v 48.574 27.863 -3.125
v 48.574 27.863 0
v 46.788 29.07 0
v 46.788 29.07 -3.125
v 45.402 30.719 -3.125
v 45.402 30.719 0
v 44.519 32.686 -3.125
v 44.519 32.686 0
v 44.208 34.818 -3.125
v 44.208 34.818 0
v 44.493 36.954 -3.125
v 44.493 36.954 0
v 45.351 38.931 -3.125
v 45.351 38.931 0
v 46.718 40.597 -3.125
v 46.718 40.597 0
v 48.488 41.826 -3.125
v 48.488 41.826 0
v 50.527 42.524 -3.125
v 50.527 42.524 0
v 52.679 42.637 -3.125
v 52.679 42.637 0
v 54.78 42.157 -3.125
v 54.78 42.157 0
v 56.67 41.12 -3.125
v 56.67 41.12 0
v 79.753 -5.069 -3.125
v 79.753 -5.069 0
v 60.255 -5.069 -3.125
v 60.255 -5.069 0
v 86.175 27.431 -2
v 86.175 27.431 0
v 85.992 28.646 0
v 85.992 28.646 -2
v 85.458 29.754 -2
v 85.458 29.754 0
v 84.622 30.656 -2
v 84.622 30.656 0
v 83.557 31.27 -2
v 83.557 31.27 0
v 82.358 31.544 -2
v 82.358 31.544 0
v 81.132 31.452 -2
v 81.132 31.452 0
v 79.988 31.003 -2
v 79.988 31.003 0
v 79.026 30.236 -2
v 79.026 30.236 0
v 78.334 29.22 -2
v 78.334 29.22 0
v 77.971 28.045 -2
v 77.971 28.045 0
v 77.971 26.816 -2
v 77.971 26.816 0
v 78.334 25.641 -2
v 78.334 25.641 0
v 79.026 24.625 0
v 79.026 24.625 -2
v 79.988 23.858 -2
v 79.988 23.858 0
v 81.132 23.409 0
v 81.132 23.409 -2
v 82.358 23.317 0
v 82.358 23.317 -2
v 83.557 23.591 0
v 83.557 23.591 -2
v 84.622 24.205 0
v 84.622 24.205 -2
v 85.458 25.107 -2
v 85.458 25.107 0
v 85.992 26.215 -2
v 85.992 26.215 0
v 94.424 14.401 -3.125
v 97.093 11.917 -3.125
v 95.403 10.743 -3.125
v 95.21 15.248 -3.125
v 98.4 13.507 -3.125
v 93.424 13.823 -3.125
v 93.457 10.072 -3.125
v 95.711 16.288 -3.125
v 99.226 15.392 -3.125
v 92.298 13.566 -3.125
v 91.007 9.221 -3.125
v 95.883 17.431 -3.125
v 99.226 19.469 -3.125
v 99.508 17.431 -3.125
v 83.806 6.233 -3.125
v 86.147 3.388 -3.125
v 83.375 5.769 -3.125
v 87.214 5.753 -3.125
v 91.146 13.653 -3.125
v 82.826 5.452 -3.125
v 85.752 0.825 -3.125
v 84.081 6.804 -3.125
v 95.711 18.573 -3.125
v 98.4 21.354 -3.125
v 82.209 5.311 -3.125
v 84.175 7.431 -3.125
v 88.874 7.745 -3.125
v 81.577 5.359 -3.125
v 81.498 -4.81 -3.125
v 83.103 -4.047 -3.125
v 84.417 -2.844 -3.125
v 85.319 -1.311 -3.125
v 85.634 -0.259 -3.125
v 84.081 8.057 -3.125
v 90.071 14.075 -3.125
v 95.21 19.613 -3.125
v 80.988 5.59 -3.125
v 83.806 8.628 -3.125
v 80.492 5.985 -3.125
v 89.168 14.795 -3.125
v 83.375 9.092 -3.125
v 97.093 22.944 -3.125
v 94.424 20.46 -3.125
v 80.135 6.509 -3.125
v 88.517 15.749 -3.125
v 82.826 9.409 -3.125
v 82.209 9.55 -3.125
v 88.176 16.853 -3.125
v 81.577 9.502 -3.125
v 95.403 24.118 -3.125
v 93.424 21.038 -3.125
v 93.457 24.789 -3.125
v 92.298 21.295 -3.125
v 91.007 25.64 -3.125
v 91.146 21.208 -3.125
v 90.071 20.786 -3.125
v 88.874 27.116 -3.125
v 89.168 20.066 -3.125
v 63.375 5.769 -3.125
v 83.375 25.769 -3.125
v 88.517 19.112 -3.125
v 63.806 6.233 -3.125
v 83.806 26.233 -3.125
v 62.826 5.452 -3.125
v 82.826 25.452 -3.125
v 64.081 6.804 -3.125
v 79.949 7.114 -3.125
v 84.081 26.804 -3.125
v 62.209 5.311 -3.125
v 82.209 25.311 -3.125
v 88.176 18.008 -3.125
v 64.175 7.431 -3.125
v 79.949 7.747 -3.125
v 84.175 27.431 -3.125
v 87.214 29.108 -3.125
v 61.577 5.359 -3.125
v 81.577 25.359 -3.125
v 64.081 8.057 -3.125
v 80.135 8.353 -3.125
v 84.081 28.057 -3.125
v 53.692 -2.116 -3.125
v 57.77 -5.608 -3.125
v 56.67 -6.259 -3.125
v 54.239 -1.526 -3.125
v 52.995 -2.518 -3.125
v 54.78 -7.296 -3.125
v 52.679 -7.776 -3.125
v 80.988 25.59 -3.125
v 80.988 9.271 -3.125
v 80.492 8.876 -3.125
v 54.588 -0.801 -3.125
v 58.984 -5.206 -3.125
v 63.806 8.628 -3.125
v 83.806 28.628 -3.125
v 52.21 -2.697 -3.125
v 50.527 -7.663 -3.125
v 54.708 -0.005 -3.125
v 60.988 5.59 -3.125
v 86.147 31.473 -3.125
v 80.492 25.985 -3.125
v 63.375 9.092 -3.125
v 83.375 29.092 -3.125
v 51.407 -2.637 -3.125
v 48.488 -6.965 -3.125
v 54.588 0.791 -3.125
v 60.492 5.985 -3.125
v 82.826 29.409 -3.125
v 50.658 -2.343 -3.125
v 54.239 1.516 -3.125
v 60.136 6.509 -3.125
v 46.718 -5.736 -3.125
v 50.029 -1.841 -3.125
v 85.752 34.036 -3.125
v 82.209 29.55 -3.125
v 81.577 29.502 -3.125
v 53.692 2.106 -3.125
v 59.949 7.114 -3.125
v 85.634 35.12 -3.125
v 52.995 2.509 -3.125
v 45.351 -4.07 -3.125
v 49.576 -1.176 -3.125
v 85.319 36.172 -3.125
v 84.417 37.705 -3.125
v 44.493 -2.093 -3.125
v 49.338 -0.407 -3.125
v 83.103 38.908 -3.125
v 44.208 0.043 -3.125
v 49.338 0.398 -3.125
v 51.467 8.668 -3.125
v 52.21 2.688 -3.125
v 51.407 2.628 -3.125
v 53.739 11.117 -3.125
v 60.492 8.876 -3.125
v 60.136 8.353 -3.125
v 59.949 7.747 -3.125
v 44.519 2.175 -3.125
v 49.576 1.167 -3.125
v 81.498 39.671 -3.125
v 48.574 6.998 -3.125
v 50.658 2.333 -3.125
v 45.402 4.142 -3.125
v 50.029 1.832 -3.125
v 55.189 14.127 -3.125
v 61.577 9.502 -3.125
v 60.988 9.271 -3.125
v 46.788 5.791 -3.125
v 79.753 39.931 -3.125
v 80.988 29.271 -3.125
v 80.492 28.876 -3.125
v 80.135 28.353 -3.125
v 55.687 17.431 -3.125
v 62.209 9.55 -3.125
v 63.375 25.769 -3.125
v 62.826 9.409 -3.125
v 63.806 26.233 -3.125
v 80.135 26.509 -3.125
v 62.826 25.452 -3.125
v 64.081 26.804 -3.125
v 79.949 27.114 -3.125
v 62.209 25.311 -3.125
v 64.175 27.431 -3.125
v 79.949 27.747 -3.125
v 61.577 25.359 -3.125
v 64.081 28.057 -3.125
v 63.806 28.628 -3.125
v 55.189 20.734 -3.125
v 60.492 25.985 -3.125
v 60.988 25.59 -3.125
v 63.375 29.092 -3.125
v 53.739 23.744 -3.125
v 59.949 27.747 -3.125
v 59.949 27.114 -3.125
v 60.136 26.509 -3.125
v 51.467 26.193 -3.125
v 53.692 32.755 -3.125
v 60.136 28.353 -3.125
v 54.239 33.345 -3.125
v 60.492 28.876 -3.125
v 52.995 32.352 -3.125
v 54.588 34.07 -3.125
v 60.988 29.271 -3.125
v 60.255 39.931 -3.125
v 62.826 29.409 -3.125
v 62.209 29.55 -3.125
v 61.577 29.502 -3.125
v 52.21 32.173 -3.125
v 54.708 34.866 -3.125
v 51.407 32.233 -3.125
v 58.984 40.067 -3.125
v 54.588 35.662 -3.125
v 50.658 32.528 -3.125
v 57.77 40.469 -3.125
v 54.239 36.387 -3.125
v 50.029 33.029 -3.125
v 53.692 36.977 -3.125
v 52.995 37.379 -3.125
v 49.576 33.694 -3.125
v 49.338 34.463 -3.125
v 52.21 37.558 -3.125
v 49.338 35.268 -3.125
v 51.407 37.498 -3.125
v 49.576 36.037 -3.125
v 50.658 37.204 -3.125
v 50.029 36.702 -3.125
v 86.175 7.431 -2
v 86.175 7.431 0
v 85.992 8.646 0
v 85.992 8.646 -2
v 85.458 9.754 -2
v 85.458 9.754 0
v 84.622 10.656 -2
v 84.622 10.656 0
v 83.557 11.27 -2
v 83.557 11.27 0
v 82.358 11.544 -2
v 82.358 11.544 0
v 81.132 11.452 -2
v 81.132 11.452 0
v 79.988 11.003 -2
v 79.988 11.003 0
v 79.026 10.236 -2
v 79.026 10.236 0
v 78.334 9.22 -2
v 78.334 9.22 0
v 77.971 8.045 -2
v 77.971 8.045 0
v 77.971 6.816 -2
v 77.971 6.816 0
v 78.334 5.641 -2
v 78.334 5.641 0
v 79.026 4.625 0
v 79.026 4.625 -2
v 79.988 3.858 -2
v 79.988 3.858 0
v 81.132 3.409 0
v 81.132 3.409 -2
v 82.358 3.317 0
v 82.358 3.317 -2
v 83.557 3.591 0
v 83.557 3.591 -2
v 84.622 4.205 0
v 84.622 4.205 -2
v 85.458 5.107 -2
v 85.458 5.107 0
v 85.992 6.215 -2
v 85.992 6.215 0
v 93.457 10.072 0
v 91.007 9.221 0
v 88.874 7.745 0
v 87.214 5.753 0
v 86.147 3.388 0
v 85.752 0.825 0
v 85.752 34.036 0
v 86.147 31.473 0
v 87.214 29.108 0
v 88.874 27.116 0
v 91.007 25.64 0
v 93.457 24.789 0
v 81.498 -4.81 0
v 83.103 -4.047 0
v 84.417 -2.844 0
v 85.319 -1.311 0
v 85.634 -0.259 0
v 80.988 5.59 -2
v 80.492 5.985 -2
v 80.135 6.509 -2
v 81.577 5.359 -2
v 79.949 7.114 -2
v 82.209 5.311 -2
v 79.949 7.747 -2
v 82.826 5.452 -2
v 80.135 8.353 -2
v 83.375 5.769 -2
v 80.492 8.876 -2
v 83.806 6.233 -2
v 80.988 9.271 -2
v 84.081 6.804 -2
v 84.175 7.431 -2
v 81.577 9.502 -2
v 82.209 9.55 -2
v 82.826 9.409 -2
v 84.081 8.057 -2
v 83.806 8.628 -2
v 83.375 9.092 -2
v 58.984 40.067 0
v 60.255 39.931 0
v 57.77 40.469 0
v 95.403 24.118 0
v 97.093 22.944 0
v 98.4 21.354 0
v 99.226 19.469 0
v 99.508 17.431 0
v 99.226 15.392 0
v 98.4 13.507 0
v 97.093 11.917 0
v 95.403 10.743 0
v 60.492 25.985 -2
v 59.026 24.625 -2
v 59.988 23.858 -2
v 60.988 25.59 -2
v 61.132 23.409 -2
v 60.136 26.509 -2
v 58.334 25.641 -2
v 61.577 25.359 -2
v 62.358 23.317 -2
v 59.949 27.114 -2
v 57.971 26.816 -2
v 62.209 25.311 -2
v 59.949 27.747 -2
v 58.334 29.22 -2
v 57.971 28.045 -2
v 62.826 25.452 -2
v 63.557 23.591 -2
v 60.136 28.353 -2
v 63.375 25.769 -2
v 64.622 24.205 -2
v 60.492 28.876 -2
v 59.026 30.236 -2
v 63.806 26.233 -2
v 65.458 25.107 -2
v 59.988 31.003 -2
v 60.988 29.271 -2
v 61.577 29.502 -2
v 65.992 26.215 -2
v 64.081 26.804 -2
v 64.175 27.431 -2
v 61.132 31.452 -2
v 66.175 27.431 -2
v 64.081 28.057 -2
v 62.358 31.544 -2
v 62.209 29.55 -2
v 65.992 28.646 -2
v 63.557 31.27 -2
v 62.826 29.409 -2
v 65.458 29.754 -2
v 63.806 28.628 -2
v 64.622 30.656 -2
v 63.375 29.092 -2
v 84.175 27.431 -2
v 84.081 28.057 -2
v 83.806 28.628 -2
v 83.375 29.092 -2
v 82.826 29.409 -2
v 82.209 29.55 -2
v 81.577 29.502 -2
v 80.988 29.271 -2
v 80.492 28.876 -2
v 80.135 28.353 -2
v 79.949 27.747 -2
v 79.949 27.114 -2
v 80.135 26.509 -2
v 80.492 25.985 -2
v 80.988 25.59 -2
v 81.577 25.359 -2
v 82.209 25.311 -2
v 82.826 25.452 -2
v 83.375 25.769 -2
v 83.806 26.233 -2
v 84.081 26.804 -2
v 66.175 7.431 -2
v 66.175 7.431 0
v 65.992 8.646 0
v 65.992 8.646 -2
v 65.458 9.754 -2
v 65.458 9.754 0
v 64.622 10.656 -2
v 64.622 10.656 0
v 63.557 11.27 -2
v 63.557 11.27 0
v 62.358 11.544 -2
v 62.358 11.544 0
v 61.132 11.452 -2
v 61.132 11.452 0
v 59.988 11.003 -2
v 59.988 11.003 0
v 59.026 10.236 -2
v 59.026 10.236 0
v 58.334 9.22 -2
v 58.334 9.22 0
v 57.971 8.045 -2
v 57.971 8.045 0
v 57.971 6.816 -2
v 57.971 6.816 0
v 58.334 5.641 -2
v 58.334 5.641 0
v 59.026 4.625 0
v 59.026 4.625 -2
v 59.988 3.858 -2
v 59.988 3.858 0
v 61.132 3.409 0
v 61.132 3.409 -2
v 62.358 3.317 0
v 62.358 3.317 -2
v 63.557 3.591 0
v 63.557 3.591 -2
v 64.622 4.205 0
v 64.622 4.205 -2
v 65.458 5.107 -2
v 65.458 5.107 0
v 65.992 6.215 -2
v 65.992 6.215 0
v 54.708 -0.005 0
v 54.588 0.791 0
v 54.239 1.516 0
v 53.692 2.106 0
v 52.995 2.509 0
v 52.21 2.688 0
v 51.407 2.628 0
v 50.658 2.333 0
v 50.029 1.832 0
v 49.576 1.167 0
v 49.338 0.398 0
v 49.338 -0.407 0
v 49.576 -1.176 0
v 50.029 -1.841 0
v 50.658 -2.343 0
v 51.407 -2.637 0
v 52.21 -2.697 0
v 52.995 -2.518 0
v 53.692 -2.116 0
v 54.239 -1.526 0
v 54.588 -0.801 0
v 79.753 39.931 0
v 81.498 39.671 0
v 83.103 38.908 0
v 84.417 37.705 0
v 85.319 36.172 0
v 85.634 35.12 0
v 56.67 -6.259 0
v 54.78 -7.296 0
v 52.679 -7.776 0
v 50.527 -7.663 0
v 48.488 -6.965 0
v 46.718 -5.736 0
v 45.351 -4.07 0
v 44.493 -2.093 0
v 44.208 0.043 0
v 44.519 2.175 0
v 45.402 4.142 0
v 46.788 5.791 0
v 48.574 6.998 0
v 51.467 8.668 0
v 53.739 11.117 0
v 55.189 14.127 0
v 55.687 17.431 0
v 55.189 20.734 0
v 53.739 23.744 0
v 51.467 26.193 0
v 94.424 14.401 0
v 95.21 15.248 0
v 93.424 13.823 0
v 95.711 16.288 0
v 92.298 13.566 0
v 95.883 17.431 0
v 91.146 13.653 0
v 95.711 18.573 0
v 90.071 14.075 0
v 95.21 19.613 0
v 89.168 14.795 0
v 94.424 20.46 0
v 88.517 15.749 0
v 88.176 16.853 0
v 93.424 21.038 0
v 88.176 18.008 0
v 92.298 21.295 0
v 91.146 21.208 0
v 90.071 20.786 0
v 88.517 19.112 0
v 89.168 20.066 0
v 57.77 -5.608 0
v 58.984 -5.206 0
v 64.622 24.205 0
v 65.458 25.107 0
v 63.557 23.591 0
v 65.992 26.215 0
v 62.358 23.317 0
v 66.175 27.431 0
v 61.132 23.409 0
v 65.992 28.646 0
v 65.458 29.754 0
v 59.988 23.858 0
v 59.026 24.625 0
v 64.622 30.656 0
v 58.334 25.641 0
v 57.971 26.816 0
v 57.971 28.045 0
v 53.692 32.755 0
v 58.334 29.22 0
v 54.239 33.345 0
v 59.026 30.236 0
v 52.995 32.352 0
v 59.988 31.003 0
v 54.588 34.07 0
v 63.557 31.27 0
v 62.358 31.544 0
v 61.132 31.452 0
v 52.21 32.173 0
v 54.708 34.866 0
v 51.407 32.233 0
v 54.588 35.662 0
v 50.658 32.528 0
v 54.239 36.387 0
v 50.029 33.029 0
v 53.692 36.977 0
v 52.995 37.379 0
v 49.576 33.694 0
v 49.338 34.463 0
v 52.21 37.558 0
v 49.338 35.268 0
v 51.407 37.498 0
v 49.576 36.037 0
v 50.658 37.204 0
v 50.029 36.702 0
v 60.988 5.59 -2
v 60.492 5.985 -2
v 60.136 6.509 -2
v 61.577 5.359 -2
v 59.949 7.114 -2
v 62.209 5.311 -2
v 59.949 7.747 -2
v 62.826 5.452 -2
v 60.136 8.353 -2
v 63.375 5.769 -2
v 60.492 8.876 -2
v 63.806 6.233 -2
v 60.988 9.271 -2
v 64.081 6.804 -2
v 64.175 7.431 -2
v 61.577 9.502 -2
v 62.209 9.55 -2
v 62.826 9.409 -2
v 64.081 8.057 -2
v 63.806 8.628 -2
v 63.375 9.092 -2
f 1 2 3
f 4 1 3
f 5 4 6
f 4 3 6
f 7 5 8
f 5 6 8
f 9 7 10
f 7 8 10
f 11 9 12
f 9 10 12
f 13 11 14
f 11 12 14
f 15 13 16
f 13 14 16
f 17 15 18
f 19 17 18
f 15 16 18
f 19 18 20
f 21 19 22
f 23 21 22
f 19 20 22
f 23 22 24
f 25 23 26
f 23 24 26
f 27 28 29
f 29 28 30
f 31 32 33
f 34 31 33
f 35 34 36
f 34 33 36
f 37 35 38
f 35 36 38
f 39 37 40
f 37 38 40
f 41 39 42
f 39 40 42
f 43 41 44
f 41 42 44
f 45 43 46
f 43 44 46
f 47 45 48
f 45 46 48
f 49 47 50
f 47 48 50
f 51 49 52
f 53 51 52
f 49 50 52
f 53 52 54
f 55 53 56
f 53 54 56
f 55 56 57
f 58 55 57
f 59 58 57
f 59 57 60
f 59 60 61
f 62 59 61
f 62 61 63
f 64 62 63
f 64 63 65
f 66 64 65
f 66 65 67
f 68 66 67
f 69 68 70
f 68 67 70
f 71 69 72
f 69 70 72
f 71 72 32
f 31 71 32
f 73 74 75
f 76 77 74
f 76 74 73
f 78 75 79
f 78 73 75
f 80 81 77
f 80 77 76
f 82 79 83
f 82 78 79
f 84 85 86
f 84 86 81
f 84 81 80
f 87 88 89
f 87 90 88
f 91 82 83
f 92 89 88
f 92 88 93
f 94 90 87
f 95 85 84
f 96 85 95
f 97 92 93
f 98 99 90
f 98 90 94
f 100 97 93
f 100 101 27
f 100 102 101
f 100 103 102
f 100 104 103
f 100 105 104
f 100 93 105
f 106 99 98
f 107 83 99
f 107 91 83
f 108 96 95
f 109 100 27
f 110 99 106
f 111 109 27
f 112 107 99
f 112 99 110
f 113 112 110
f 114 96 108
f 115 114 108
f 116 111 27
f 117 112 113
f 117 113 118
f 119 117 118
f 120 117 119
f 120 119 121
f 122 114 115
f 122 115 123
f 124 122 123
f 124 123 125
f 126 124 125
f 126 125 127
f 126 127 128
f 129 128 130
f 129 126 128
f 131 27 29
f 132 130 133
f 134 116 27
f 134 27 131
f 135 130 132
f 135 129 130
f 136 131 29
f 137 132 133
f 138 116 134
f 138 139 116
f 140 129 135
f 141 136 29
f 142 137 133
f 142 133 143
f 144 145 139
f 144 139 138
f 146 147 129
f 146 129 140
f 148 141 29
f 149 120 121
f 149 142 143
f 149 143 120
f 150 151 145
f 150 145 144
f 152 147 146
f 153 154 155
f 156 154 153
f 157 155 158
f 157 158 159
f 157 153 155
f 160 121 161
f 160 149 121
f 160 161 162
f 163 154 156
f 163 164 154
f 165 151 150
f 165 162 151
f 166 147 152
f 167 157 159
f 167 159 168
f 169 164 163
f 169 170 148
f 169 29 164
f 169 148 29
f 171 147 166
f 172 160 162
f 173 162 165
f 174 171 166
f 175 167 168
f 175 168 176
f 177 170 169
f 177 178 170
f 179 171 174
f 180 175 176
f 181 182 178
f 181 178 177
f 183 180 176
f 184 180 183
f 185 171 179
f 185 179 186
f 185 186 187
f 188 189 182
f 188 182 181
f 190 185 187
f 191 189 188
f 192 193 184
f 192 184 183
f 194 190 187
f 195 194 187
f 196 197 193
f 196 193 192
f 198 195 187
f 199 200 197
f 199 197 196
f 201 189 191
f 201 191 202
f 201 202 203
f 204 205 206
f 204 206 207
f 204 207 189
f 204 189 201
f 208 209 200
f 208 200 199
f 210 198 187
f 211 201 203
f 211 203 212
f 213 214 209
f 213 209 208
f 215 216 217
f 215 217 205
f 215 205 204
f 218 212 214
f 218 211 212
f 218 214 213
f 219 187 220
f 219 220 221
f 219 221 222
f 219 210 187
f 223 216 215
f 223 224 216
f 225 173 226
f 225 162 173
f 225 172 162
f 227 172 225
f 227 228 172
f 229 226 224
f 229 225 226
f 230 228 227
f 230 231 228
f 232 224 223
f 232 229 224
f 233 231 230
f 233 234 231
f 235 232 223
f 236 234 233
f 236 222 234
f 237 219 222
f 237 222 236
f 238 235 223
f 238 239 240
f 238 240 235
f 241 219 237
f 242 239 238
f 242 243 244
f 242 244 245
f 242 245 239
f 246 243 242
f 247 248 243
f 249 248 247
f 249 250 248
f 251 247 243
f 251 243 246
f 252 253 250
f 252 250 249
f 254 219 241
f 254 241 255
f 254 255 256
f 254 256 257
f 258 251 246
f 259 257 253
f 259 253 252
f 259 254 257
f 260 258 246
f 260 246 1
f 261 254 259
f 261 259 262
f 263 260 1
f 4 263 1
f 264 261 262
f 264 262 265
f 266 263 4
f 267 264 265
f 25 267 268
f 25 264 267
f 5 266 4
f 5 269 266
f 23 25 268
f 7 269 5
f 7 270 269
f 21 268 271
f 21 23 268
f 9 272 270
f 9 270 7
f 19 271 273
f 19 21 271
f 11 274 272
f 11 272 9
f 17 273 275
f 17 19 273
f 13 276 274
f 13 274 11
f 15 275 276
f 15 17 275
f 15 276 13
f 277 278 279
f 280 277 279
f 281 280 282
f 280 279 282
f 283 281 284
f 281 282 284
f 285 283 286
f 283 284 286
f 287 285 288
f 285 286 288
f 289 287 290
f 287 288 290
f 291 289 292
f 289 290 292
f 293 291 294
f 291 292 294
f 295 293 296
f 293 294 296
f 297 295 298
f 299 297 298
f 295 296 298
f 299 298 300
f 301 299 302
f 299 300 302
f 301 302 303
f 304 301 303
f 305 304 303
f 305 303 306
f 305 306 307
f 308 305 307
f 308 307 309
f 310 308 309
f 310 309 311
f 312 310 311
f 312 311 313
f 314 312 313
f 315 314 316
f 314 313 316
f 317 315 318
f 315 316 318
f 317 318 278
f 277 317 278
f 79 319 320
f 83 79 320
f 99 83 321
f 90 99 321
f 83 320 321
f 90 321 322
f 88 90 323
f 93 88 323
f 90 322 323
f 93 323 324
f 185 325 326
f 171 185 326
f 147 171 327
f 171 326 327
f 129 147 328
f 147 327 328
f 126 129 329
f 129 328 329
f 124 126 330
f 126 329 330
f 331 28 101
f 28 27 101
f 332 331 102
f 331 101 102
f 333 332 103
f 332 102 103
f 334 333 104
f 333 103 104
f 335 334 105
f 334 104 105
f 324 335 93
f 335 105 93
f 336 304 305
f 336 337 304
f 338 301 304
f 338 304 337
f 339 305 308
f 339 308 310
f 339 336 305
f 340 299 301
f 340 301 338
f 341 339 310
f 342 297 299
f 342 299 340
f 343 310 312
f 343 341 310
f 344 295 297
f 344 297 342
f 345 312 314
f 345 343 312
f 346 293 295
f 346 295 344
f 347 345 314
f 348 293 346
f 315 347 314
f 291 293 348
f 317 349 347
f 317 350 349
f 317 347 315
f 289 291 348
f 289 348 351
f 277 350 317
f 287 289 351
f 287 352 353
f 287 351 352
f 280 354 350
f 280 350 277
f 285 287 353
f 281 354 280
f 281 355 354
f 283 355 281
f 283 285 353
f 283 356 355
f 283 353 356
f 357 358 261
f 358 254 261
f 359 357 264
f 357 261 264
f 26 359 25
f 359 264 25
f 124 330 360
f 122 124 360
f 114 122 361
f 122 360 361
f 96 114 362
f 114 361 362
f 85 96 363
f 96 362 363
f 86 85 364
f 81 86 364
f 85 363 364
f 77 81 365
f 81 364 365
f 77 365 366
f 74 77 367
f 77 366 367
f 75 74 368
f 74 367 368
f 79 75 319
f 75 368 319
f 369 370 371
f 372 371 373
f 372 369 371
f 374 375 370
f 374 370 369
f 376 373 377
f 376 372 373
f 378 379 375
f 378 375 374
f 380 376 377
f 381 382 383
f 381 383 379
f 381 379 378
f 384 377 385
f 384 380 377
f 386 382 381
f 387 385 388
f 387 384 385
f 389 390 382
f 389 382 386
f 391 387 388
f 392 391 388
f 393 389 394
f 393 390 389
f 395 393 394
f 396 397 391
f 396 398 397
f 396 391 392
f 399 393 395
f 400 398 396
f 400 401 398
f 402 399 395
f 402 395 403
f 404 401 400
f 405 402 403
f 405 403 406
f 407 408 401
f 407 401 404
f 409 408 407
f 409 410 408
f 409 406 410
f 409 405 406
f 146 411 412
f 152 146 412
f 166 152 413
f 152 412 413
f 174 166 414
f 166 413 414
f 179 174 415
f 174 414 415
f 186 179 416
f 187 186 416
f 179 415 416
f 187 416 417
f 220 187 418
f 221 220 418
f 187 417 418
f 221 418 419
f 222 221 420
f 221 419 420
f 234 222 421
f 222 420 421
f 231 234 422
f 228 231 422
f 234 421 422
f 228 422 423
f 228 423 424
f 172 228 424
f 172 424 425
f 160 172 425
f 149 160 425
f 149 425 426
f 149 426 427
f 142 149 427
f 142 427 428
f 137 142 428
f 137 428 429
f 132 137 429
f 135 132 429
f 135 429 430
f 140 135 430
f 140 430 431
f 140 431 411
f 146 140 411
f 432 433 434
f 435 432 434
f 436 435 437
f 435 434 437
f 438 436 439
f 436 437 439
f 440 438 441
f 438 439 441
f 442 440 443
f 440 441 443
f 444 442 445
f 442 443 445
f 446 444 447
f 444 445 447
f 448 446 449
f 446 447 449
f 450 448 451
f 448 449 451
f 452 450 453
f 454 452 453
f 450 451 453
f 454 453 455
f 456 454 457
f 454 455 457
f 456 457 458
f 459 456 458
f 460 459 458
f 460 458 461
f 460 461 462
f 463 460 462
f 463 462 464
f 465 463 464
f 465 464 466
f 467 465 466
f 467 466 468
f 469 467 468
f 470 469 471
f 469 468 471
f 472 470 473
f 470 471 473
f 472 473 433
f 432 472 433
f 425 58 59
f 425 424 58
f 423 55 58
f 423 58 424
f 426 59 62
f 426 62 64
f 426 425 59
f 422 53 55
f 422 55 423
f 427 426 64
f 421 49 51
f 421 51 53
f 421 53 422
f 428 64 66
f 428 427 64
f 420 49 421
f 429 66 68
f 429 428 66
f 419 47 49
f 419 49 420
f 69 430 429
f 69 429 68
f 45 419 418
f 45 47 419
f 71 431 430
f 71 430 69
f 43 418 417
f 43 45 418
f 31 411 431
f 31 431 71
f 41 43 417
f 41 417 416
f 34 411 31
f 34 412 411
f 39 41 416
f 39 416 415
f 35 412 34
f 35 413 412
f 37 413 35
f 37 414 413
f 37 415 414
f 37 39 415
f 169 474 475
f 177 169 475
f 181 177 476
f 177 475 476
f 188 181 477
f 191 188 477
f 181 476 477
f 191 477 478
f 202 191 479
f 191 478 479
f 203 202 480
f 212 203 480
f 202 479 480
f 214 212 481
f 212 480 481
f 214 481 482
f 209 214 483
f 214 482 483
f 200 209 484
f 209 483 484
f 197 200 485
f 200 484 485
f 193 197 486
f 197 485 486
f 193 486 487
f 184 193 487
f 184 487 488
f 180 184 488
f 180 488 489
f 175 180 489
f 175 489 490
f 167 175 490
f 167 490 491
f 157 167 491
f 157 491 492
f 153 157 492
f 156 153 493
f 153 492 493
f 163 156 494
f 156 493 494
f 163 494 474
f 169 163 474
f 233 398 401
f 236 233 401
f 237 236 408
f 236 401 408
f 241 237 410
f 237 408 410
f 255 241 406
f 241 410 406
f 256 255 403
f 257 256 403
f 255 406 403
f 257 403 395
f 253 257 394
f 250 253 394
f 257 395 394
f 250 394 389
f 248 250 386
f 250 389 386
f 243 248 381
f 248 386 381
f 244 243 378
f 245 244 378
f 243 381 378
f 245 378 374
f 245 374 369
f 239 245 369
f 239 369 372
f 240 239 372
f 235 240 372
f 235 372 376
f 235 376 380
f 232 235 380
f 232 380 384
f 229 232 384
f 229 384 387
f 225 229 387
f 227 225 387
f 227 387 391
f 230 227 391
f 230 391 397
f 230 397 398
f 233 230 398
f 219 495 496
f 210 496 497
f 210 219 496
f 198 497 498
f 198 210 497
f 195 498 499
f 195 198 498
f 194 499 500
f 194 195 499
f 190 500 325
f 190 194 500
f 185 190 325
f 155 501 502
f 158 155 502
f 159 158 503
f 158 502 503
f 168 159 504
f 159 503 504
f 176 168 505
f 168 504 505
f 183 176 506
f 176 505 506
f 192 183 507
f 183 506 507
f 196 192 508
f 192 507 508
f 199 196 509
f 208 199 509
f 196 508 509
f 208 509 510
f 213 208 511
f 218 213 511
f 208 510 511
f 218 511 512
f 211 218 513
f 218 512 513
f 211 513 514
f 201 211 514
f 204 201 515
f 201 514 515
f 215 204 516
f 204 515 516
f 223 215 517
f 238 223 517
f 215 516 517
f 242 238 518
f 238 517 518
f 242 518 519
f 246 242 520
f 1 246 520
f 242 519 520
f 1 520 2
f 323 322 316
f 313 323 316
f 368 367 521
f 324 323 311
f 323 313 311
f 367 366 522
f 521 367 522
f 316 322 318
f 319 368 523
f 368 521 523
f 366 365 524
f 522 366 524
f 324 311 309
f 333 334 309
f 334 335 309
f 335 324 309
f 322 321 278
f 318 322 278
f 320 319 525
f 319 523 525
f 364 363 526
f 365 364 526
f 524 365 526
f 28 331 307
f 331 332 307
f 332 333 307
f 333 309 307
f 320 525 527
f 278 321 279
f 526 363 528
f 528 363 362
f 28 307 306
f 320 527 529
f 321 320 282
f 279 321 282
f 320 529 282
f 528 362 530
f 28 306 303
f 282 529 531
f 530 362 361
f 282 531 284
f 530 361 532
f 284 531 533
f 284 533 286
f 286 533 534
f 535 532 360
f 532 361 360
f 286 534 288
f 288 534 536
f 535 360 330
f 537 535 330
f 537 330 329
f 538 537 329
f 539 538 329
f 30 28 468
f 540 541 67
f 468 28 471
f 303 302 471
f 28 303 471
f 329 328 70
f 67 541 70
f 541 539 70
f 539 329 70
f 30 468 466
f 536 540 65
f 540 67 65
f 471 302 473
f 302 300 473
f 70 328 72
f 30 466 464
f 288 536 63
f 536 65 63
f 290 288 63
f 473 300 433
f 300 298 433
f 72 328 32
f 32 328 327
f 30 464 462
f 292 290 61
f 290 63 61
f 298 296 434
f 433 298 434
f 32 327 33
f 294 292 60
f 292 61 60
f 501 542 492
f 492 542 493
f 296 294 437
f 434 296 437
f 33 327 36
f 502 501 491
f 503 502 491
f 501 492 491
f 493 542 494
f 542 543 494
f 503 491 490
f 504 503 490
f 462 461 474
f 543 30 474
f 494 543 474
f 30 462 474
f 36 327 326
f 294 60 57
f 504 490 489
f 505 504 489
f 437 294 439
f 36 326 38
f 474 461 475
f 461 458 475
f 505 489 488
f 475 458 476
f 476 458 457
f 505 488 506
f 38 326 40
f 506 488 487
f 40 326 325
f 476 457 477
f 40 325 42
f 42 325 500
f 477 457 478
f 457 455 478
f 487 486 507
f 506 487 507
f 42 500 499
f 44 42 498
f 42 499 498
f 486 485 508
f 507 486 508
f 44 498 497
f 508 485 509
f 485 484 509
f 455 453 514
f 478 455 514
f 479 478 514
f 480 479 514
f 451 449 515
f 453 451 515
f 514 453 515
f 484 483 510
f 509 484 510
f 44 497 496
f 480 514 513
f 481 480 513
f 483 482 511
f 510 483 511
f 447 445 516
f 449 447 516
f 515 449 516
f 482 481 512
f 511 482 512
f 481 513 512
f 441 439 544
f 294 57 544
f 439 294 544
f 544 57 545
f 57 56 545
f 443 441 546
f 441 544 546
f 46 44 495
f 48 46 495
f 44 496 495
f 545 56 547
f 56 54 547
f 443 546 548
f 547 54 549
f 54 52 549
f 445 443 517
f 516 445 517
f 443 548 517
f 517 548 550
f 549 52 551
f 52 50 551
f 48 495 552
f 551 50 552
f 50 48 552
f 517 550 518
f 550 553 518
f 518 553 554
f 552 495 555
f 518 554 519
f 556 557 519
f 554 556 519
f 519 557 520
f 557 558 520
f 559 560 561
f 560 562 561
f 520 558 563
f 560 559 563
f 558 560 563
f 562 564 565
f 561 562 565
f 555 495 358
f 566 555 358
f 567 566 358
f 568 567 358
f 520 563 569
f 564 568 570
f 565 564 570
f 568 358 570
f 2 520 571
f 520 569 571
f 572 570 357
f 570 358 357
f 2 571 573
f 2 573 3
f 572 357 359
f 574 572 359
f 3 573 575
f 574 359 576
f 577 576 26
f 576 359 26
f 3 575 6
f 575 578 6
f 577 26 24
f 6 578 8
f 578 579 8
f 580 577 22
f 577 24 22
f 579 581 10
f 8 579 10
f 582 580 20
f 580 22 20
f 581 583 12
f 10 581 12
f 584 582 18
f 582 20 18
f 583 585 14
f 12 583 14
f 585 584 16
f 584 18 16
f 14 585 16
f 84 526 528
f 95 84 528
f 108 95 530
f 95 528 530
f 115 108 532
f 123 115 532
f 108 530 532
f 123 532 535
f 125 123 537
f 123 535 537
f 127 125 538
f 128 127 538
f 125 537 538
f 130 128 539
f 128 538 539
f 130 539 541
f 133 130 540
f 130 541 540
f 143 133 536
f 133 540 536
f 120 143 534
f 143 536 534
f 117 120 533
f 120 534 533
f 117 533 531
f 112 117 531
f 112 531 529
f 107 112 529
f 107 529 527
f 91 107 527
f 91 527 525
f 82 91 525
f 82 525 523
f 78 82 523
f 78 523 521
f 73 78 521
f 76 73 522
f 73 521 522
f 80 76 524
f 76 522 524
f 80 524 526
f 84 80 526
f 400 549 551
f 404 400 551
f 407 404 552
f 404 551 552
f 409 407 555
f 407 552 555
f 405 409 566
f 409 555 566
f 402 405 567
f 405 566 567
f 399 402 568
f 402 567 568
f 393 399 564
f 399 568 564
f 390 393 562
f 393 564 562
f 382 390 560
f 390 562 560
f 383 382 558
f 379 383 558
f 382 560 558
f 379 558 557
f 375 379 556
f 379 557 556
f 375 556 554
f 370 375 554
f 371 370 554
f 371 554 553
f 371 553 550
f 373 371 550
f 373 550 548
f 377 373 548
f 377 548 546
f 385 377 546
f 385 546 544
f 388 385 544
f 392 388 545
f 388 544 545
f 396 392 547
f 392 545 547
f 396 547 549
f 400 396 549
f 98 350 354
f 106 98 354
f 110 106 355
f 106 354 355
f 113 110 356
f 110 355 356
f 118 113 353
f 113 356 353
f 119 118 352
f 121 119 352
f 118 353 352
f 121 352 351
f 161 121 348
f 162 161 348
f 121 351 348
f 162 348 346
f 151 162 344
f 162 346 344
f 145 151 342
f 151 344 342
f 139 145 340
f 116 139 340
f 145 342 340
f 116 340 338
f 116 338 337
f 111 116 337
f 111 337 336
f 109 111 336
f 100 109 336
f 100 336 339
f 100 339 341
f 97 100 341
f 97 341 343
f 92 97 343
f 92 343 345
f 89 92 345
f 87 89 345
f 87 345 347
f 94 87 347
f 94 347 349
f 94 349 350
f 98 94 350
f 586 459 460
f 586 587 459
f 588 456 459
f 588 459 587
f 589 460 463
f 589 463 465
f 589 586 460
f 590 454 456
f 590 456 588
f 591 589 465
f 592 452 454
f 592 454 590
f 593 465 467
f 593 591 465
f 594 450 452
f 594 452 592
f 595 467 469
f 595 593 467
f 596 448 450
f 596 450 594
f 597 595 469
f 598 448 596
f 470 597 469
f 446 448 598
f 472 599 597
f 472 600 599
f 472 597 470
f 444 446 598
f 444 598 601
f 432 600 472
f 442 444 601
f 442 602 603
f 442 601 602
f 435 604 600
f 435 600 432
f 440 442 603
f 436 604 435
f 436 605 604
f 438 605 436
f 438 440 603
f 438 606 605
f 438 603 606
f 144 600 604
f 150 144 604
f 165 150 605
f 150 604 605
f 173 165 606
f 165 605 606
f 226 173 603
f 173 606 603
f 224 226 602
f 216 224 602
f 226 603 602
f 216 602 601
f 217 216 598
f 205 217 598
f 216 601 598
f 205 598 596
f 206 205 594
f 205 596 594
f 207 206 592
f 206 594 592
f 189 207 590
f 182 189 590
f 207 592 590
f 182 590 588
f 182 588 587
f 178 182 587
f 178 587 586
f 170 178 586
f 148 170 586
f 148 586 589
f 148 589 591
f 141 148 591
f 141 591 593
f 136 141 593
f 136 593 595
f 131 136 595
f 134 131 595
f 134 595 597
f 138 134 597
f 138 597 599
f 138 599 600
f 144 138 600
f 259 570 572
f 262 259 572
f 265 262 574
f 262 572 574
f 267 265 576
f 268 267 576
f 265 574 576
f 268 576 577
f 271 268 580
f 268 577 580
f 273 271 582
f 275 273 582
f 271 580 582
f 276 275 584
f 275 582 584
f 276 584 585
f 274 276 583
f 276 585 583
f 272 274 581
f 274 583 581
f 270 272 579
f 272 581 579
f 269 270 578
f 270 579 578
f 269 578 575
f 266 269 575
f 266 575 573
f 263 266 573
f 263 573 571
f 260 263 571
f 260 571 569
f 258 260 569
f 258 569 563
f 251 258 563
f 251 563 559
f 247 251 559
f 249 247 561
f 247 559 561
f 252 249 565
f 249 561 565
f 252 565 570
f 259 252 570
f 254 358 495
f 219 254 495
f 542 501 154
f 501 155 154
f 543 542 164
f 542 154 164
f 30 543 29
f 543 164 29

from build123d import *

# Parameters (mm, degrees)
MODEL_R             = 2.7
MODEL_R_2           = 3.875
MODEL_R_3           = 2.125
BOSS_EXTRUDE1_DEPTH = 3.125
MODEL_3_R           = 4.125
MODEL_3_R_2         = 2.125
CUT_EXTRUDE1_DEPTH  = 2
FILLET1_R           = 6
FILLET2_R           = 6


with BuildPart() as part:
    # Model → Boss-Extrude1 (new body)
    with BuildSketch(Plane.XY):
        with BuildLine():
            Line((85.751165458, 39.930508181), (57.940219492, 39.930508181))
            ThreePointArc((57.940219492, 39.930508181), (45.846452894, 39.648352972), (48.573590158, 27.862703884))
            ThreePointArc((48.573590158, 27.862703884), (55.686625956, 17.430508181), (48.573590158, 6.998312478))
            ThreePointArc((48.573590158, 6.998312478), (45.846452894, -4.78733661), (57.940219492, -5.069491819))
            Line((57.940219492, -5.069491819), (85.751165458, -5.069491819))
            Line((85.751165458, -5.069491819), (85.751165458, 0.769903947))
            ThreePointArc((85.751165458, 0.769903947), (87.9590359, 6.783913161), (93.457436342, 10.071859524))
            ThreePointArc((93.457436342, 10.071859524), (99.50819863, 17.430508181), (93.457436342, 24.789156838))
            ThreePointArc((93.457436342, 24.789156838), (87.9590359, 28.077103201), (85.751165458, 34.091112415))
            Line((85.751165458, 34.091112415), (85.751165458, 39.930508181))
        make_face()
        with Locations((52.008207521, -0.004787091)):
            Circle(MODEL_R, mode=Mode.SUBTRACT)
        with Locations((52.008207521, 34.865803453)):
            Circle(MODEL_R, mode=Mode.SUBTRACT)
        with Locations((92.00819863, 17.430508181)):
            Circle(MODEL_R_2, mode=Mode.SUBTRACT)
        with Locations((62.05010788, 7.430508181)):
            Circle(MODEL_R_3, mode=Mode.SUBTRACT)
        with Locations((82.050054867, 7.430508181)):
            Circle(MODEL_R_3, mode=Mode.SUBTRACT)
        with Locations((62.05010788, 27.430508181)):
            Circle(MODEL_R_3, mode=Mode.SUBTRACT)
        with Locations((82.050054867, 27.430508181)):
            Circle(MODEL_R_3, mode=Mode.SUBTRACT)
    extrude(amount=-BOSS_EXTRUDE1_DEPTH)

    # Model<3> → Cut-Extrude1 (cut)
    # profile 1 of 4: a face of its own
    with BuildSketch(Plane.XY):
        with Locations((82.050054867, 27.430508181)):
            Circle(MODEL_3_R)
    # profile 2 of 4: a face of its own
    with BuildSketch(Plane.XY):
        with Locations((62.05010788, 27.430508181)):
            Circle(MODEL_3_R)
        with Locations((62.05010788, 27.430508181)):
            Circle(MODEL_3_R_2, mode=Mode.SUBTRACT)
    # profile 3 of 4: a face of its own
    with BuildSketch(Plane.XY):
        with Locations((62.05010788, 7.430508181)):
            Circle(MODEL_3_R)
        with Locations((62.05010788, 7.430508181)):
            Circle(MODEL_3_R_2, mode=Mode.SUBTRACT)
    # profile 4 of 4: a face of its own
    with BuildSketch(Plane.XY):
        with Locations((82.050054867, 7.430508181)):
            Circle(MODEL_3_R)
        with Locations((82.050054867, 7.430508181)):
            Circle(MODEL_3_R_2, mode=Mode.SUBTRACT)
    extrude(amount=-CUT_EXTRUDE1_DEPTH, mode=Mode.SUBTRACT)

    # Fillet1
    fillet1_edges = [part.edges().sort_by_distance(p)[0] for p in [
        (85.751165458, -5.069491819, -1.5625),
        (85.751165458, 39.930508181, -1.5625),
    ]]
    fillet(fillet1_edges, radius=FILLET1_R)

    # Fillet2
    fillet2_edges = [part.edges().sort_by_distance(p)[0] for p in [
        (57.940219492, 39.930508181, -1.5625),
        (57.940219492, -5.069491819, -1.5625),
    ]]
    fillet(fillet2_edges, radius=FILLET2_R)


solid = part.part
